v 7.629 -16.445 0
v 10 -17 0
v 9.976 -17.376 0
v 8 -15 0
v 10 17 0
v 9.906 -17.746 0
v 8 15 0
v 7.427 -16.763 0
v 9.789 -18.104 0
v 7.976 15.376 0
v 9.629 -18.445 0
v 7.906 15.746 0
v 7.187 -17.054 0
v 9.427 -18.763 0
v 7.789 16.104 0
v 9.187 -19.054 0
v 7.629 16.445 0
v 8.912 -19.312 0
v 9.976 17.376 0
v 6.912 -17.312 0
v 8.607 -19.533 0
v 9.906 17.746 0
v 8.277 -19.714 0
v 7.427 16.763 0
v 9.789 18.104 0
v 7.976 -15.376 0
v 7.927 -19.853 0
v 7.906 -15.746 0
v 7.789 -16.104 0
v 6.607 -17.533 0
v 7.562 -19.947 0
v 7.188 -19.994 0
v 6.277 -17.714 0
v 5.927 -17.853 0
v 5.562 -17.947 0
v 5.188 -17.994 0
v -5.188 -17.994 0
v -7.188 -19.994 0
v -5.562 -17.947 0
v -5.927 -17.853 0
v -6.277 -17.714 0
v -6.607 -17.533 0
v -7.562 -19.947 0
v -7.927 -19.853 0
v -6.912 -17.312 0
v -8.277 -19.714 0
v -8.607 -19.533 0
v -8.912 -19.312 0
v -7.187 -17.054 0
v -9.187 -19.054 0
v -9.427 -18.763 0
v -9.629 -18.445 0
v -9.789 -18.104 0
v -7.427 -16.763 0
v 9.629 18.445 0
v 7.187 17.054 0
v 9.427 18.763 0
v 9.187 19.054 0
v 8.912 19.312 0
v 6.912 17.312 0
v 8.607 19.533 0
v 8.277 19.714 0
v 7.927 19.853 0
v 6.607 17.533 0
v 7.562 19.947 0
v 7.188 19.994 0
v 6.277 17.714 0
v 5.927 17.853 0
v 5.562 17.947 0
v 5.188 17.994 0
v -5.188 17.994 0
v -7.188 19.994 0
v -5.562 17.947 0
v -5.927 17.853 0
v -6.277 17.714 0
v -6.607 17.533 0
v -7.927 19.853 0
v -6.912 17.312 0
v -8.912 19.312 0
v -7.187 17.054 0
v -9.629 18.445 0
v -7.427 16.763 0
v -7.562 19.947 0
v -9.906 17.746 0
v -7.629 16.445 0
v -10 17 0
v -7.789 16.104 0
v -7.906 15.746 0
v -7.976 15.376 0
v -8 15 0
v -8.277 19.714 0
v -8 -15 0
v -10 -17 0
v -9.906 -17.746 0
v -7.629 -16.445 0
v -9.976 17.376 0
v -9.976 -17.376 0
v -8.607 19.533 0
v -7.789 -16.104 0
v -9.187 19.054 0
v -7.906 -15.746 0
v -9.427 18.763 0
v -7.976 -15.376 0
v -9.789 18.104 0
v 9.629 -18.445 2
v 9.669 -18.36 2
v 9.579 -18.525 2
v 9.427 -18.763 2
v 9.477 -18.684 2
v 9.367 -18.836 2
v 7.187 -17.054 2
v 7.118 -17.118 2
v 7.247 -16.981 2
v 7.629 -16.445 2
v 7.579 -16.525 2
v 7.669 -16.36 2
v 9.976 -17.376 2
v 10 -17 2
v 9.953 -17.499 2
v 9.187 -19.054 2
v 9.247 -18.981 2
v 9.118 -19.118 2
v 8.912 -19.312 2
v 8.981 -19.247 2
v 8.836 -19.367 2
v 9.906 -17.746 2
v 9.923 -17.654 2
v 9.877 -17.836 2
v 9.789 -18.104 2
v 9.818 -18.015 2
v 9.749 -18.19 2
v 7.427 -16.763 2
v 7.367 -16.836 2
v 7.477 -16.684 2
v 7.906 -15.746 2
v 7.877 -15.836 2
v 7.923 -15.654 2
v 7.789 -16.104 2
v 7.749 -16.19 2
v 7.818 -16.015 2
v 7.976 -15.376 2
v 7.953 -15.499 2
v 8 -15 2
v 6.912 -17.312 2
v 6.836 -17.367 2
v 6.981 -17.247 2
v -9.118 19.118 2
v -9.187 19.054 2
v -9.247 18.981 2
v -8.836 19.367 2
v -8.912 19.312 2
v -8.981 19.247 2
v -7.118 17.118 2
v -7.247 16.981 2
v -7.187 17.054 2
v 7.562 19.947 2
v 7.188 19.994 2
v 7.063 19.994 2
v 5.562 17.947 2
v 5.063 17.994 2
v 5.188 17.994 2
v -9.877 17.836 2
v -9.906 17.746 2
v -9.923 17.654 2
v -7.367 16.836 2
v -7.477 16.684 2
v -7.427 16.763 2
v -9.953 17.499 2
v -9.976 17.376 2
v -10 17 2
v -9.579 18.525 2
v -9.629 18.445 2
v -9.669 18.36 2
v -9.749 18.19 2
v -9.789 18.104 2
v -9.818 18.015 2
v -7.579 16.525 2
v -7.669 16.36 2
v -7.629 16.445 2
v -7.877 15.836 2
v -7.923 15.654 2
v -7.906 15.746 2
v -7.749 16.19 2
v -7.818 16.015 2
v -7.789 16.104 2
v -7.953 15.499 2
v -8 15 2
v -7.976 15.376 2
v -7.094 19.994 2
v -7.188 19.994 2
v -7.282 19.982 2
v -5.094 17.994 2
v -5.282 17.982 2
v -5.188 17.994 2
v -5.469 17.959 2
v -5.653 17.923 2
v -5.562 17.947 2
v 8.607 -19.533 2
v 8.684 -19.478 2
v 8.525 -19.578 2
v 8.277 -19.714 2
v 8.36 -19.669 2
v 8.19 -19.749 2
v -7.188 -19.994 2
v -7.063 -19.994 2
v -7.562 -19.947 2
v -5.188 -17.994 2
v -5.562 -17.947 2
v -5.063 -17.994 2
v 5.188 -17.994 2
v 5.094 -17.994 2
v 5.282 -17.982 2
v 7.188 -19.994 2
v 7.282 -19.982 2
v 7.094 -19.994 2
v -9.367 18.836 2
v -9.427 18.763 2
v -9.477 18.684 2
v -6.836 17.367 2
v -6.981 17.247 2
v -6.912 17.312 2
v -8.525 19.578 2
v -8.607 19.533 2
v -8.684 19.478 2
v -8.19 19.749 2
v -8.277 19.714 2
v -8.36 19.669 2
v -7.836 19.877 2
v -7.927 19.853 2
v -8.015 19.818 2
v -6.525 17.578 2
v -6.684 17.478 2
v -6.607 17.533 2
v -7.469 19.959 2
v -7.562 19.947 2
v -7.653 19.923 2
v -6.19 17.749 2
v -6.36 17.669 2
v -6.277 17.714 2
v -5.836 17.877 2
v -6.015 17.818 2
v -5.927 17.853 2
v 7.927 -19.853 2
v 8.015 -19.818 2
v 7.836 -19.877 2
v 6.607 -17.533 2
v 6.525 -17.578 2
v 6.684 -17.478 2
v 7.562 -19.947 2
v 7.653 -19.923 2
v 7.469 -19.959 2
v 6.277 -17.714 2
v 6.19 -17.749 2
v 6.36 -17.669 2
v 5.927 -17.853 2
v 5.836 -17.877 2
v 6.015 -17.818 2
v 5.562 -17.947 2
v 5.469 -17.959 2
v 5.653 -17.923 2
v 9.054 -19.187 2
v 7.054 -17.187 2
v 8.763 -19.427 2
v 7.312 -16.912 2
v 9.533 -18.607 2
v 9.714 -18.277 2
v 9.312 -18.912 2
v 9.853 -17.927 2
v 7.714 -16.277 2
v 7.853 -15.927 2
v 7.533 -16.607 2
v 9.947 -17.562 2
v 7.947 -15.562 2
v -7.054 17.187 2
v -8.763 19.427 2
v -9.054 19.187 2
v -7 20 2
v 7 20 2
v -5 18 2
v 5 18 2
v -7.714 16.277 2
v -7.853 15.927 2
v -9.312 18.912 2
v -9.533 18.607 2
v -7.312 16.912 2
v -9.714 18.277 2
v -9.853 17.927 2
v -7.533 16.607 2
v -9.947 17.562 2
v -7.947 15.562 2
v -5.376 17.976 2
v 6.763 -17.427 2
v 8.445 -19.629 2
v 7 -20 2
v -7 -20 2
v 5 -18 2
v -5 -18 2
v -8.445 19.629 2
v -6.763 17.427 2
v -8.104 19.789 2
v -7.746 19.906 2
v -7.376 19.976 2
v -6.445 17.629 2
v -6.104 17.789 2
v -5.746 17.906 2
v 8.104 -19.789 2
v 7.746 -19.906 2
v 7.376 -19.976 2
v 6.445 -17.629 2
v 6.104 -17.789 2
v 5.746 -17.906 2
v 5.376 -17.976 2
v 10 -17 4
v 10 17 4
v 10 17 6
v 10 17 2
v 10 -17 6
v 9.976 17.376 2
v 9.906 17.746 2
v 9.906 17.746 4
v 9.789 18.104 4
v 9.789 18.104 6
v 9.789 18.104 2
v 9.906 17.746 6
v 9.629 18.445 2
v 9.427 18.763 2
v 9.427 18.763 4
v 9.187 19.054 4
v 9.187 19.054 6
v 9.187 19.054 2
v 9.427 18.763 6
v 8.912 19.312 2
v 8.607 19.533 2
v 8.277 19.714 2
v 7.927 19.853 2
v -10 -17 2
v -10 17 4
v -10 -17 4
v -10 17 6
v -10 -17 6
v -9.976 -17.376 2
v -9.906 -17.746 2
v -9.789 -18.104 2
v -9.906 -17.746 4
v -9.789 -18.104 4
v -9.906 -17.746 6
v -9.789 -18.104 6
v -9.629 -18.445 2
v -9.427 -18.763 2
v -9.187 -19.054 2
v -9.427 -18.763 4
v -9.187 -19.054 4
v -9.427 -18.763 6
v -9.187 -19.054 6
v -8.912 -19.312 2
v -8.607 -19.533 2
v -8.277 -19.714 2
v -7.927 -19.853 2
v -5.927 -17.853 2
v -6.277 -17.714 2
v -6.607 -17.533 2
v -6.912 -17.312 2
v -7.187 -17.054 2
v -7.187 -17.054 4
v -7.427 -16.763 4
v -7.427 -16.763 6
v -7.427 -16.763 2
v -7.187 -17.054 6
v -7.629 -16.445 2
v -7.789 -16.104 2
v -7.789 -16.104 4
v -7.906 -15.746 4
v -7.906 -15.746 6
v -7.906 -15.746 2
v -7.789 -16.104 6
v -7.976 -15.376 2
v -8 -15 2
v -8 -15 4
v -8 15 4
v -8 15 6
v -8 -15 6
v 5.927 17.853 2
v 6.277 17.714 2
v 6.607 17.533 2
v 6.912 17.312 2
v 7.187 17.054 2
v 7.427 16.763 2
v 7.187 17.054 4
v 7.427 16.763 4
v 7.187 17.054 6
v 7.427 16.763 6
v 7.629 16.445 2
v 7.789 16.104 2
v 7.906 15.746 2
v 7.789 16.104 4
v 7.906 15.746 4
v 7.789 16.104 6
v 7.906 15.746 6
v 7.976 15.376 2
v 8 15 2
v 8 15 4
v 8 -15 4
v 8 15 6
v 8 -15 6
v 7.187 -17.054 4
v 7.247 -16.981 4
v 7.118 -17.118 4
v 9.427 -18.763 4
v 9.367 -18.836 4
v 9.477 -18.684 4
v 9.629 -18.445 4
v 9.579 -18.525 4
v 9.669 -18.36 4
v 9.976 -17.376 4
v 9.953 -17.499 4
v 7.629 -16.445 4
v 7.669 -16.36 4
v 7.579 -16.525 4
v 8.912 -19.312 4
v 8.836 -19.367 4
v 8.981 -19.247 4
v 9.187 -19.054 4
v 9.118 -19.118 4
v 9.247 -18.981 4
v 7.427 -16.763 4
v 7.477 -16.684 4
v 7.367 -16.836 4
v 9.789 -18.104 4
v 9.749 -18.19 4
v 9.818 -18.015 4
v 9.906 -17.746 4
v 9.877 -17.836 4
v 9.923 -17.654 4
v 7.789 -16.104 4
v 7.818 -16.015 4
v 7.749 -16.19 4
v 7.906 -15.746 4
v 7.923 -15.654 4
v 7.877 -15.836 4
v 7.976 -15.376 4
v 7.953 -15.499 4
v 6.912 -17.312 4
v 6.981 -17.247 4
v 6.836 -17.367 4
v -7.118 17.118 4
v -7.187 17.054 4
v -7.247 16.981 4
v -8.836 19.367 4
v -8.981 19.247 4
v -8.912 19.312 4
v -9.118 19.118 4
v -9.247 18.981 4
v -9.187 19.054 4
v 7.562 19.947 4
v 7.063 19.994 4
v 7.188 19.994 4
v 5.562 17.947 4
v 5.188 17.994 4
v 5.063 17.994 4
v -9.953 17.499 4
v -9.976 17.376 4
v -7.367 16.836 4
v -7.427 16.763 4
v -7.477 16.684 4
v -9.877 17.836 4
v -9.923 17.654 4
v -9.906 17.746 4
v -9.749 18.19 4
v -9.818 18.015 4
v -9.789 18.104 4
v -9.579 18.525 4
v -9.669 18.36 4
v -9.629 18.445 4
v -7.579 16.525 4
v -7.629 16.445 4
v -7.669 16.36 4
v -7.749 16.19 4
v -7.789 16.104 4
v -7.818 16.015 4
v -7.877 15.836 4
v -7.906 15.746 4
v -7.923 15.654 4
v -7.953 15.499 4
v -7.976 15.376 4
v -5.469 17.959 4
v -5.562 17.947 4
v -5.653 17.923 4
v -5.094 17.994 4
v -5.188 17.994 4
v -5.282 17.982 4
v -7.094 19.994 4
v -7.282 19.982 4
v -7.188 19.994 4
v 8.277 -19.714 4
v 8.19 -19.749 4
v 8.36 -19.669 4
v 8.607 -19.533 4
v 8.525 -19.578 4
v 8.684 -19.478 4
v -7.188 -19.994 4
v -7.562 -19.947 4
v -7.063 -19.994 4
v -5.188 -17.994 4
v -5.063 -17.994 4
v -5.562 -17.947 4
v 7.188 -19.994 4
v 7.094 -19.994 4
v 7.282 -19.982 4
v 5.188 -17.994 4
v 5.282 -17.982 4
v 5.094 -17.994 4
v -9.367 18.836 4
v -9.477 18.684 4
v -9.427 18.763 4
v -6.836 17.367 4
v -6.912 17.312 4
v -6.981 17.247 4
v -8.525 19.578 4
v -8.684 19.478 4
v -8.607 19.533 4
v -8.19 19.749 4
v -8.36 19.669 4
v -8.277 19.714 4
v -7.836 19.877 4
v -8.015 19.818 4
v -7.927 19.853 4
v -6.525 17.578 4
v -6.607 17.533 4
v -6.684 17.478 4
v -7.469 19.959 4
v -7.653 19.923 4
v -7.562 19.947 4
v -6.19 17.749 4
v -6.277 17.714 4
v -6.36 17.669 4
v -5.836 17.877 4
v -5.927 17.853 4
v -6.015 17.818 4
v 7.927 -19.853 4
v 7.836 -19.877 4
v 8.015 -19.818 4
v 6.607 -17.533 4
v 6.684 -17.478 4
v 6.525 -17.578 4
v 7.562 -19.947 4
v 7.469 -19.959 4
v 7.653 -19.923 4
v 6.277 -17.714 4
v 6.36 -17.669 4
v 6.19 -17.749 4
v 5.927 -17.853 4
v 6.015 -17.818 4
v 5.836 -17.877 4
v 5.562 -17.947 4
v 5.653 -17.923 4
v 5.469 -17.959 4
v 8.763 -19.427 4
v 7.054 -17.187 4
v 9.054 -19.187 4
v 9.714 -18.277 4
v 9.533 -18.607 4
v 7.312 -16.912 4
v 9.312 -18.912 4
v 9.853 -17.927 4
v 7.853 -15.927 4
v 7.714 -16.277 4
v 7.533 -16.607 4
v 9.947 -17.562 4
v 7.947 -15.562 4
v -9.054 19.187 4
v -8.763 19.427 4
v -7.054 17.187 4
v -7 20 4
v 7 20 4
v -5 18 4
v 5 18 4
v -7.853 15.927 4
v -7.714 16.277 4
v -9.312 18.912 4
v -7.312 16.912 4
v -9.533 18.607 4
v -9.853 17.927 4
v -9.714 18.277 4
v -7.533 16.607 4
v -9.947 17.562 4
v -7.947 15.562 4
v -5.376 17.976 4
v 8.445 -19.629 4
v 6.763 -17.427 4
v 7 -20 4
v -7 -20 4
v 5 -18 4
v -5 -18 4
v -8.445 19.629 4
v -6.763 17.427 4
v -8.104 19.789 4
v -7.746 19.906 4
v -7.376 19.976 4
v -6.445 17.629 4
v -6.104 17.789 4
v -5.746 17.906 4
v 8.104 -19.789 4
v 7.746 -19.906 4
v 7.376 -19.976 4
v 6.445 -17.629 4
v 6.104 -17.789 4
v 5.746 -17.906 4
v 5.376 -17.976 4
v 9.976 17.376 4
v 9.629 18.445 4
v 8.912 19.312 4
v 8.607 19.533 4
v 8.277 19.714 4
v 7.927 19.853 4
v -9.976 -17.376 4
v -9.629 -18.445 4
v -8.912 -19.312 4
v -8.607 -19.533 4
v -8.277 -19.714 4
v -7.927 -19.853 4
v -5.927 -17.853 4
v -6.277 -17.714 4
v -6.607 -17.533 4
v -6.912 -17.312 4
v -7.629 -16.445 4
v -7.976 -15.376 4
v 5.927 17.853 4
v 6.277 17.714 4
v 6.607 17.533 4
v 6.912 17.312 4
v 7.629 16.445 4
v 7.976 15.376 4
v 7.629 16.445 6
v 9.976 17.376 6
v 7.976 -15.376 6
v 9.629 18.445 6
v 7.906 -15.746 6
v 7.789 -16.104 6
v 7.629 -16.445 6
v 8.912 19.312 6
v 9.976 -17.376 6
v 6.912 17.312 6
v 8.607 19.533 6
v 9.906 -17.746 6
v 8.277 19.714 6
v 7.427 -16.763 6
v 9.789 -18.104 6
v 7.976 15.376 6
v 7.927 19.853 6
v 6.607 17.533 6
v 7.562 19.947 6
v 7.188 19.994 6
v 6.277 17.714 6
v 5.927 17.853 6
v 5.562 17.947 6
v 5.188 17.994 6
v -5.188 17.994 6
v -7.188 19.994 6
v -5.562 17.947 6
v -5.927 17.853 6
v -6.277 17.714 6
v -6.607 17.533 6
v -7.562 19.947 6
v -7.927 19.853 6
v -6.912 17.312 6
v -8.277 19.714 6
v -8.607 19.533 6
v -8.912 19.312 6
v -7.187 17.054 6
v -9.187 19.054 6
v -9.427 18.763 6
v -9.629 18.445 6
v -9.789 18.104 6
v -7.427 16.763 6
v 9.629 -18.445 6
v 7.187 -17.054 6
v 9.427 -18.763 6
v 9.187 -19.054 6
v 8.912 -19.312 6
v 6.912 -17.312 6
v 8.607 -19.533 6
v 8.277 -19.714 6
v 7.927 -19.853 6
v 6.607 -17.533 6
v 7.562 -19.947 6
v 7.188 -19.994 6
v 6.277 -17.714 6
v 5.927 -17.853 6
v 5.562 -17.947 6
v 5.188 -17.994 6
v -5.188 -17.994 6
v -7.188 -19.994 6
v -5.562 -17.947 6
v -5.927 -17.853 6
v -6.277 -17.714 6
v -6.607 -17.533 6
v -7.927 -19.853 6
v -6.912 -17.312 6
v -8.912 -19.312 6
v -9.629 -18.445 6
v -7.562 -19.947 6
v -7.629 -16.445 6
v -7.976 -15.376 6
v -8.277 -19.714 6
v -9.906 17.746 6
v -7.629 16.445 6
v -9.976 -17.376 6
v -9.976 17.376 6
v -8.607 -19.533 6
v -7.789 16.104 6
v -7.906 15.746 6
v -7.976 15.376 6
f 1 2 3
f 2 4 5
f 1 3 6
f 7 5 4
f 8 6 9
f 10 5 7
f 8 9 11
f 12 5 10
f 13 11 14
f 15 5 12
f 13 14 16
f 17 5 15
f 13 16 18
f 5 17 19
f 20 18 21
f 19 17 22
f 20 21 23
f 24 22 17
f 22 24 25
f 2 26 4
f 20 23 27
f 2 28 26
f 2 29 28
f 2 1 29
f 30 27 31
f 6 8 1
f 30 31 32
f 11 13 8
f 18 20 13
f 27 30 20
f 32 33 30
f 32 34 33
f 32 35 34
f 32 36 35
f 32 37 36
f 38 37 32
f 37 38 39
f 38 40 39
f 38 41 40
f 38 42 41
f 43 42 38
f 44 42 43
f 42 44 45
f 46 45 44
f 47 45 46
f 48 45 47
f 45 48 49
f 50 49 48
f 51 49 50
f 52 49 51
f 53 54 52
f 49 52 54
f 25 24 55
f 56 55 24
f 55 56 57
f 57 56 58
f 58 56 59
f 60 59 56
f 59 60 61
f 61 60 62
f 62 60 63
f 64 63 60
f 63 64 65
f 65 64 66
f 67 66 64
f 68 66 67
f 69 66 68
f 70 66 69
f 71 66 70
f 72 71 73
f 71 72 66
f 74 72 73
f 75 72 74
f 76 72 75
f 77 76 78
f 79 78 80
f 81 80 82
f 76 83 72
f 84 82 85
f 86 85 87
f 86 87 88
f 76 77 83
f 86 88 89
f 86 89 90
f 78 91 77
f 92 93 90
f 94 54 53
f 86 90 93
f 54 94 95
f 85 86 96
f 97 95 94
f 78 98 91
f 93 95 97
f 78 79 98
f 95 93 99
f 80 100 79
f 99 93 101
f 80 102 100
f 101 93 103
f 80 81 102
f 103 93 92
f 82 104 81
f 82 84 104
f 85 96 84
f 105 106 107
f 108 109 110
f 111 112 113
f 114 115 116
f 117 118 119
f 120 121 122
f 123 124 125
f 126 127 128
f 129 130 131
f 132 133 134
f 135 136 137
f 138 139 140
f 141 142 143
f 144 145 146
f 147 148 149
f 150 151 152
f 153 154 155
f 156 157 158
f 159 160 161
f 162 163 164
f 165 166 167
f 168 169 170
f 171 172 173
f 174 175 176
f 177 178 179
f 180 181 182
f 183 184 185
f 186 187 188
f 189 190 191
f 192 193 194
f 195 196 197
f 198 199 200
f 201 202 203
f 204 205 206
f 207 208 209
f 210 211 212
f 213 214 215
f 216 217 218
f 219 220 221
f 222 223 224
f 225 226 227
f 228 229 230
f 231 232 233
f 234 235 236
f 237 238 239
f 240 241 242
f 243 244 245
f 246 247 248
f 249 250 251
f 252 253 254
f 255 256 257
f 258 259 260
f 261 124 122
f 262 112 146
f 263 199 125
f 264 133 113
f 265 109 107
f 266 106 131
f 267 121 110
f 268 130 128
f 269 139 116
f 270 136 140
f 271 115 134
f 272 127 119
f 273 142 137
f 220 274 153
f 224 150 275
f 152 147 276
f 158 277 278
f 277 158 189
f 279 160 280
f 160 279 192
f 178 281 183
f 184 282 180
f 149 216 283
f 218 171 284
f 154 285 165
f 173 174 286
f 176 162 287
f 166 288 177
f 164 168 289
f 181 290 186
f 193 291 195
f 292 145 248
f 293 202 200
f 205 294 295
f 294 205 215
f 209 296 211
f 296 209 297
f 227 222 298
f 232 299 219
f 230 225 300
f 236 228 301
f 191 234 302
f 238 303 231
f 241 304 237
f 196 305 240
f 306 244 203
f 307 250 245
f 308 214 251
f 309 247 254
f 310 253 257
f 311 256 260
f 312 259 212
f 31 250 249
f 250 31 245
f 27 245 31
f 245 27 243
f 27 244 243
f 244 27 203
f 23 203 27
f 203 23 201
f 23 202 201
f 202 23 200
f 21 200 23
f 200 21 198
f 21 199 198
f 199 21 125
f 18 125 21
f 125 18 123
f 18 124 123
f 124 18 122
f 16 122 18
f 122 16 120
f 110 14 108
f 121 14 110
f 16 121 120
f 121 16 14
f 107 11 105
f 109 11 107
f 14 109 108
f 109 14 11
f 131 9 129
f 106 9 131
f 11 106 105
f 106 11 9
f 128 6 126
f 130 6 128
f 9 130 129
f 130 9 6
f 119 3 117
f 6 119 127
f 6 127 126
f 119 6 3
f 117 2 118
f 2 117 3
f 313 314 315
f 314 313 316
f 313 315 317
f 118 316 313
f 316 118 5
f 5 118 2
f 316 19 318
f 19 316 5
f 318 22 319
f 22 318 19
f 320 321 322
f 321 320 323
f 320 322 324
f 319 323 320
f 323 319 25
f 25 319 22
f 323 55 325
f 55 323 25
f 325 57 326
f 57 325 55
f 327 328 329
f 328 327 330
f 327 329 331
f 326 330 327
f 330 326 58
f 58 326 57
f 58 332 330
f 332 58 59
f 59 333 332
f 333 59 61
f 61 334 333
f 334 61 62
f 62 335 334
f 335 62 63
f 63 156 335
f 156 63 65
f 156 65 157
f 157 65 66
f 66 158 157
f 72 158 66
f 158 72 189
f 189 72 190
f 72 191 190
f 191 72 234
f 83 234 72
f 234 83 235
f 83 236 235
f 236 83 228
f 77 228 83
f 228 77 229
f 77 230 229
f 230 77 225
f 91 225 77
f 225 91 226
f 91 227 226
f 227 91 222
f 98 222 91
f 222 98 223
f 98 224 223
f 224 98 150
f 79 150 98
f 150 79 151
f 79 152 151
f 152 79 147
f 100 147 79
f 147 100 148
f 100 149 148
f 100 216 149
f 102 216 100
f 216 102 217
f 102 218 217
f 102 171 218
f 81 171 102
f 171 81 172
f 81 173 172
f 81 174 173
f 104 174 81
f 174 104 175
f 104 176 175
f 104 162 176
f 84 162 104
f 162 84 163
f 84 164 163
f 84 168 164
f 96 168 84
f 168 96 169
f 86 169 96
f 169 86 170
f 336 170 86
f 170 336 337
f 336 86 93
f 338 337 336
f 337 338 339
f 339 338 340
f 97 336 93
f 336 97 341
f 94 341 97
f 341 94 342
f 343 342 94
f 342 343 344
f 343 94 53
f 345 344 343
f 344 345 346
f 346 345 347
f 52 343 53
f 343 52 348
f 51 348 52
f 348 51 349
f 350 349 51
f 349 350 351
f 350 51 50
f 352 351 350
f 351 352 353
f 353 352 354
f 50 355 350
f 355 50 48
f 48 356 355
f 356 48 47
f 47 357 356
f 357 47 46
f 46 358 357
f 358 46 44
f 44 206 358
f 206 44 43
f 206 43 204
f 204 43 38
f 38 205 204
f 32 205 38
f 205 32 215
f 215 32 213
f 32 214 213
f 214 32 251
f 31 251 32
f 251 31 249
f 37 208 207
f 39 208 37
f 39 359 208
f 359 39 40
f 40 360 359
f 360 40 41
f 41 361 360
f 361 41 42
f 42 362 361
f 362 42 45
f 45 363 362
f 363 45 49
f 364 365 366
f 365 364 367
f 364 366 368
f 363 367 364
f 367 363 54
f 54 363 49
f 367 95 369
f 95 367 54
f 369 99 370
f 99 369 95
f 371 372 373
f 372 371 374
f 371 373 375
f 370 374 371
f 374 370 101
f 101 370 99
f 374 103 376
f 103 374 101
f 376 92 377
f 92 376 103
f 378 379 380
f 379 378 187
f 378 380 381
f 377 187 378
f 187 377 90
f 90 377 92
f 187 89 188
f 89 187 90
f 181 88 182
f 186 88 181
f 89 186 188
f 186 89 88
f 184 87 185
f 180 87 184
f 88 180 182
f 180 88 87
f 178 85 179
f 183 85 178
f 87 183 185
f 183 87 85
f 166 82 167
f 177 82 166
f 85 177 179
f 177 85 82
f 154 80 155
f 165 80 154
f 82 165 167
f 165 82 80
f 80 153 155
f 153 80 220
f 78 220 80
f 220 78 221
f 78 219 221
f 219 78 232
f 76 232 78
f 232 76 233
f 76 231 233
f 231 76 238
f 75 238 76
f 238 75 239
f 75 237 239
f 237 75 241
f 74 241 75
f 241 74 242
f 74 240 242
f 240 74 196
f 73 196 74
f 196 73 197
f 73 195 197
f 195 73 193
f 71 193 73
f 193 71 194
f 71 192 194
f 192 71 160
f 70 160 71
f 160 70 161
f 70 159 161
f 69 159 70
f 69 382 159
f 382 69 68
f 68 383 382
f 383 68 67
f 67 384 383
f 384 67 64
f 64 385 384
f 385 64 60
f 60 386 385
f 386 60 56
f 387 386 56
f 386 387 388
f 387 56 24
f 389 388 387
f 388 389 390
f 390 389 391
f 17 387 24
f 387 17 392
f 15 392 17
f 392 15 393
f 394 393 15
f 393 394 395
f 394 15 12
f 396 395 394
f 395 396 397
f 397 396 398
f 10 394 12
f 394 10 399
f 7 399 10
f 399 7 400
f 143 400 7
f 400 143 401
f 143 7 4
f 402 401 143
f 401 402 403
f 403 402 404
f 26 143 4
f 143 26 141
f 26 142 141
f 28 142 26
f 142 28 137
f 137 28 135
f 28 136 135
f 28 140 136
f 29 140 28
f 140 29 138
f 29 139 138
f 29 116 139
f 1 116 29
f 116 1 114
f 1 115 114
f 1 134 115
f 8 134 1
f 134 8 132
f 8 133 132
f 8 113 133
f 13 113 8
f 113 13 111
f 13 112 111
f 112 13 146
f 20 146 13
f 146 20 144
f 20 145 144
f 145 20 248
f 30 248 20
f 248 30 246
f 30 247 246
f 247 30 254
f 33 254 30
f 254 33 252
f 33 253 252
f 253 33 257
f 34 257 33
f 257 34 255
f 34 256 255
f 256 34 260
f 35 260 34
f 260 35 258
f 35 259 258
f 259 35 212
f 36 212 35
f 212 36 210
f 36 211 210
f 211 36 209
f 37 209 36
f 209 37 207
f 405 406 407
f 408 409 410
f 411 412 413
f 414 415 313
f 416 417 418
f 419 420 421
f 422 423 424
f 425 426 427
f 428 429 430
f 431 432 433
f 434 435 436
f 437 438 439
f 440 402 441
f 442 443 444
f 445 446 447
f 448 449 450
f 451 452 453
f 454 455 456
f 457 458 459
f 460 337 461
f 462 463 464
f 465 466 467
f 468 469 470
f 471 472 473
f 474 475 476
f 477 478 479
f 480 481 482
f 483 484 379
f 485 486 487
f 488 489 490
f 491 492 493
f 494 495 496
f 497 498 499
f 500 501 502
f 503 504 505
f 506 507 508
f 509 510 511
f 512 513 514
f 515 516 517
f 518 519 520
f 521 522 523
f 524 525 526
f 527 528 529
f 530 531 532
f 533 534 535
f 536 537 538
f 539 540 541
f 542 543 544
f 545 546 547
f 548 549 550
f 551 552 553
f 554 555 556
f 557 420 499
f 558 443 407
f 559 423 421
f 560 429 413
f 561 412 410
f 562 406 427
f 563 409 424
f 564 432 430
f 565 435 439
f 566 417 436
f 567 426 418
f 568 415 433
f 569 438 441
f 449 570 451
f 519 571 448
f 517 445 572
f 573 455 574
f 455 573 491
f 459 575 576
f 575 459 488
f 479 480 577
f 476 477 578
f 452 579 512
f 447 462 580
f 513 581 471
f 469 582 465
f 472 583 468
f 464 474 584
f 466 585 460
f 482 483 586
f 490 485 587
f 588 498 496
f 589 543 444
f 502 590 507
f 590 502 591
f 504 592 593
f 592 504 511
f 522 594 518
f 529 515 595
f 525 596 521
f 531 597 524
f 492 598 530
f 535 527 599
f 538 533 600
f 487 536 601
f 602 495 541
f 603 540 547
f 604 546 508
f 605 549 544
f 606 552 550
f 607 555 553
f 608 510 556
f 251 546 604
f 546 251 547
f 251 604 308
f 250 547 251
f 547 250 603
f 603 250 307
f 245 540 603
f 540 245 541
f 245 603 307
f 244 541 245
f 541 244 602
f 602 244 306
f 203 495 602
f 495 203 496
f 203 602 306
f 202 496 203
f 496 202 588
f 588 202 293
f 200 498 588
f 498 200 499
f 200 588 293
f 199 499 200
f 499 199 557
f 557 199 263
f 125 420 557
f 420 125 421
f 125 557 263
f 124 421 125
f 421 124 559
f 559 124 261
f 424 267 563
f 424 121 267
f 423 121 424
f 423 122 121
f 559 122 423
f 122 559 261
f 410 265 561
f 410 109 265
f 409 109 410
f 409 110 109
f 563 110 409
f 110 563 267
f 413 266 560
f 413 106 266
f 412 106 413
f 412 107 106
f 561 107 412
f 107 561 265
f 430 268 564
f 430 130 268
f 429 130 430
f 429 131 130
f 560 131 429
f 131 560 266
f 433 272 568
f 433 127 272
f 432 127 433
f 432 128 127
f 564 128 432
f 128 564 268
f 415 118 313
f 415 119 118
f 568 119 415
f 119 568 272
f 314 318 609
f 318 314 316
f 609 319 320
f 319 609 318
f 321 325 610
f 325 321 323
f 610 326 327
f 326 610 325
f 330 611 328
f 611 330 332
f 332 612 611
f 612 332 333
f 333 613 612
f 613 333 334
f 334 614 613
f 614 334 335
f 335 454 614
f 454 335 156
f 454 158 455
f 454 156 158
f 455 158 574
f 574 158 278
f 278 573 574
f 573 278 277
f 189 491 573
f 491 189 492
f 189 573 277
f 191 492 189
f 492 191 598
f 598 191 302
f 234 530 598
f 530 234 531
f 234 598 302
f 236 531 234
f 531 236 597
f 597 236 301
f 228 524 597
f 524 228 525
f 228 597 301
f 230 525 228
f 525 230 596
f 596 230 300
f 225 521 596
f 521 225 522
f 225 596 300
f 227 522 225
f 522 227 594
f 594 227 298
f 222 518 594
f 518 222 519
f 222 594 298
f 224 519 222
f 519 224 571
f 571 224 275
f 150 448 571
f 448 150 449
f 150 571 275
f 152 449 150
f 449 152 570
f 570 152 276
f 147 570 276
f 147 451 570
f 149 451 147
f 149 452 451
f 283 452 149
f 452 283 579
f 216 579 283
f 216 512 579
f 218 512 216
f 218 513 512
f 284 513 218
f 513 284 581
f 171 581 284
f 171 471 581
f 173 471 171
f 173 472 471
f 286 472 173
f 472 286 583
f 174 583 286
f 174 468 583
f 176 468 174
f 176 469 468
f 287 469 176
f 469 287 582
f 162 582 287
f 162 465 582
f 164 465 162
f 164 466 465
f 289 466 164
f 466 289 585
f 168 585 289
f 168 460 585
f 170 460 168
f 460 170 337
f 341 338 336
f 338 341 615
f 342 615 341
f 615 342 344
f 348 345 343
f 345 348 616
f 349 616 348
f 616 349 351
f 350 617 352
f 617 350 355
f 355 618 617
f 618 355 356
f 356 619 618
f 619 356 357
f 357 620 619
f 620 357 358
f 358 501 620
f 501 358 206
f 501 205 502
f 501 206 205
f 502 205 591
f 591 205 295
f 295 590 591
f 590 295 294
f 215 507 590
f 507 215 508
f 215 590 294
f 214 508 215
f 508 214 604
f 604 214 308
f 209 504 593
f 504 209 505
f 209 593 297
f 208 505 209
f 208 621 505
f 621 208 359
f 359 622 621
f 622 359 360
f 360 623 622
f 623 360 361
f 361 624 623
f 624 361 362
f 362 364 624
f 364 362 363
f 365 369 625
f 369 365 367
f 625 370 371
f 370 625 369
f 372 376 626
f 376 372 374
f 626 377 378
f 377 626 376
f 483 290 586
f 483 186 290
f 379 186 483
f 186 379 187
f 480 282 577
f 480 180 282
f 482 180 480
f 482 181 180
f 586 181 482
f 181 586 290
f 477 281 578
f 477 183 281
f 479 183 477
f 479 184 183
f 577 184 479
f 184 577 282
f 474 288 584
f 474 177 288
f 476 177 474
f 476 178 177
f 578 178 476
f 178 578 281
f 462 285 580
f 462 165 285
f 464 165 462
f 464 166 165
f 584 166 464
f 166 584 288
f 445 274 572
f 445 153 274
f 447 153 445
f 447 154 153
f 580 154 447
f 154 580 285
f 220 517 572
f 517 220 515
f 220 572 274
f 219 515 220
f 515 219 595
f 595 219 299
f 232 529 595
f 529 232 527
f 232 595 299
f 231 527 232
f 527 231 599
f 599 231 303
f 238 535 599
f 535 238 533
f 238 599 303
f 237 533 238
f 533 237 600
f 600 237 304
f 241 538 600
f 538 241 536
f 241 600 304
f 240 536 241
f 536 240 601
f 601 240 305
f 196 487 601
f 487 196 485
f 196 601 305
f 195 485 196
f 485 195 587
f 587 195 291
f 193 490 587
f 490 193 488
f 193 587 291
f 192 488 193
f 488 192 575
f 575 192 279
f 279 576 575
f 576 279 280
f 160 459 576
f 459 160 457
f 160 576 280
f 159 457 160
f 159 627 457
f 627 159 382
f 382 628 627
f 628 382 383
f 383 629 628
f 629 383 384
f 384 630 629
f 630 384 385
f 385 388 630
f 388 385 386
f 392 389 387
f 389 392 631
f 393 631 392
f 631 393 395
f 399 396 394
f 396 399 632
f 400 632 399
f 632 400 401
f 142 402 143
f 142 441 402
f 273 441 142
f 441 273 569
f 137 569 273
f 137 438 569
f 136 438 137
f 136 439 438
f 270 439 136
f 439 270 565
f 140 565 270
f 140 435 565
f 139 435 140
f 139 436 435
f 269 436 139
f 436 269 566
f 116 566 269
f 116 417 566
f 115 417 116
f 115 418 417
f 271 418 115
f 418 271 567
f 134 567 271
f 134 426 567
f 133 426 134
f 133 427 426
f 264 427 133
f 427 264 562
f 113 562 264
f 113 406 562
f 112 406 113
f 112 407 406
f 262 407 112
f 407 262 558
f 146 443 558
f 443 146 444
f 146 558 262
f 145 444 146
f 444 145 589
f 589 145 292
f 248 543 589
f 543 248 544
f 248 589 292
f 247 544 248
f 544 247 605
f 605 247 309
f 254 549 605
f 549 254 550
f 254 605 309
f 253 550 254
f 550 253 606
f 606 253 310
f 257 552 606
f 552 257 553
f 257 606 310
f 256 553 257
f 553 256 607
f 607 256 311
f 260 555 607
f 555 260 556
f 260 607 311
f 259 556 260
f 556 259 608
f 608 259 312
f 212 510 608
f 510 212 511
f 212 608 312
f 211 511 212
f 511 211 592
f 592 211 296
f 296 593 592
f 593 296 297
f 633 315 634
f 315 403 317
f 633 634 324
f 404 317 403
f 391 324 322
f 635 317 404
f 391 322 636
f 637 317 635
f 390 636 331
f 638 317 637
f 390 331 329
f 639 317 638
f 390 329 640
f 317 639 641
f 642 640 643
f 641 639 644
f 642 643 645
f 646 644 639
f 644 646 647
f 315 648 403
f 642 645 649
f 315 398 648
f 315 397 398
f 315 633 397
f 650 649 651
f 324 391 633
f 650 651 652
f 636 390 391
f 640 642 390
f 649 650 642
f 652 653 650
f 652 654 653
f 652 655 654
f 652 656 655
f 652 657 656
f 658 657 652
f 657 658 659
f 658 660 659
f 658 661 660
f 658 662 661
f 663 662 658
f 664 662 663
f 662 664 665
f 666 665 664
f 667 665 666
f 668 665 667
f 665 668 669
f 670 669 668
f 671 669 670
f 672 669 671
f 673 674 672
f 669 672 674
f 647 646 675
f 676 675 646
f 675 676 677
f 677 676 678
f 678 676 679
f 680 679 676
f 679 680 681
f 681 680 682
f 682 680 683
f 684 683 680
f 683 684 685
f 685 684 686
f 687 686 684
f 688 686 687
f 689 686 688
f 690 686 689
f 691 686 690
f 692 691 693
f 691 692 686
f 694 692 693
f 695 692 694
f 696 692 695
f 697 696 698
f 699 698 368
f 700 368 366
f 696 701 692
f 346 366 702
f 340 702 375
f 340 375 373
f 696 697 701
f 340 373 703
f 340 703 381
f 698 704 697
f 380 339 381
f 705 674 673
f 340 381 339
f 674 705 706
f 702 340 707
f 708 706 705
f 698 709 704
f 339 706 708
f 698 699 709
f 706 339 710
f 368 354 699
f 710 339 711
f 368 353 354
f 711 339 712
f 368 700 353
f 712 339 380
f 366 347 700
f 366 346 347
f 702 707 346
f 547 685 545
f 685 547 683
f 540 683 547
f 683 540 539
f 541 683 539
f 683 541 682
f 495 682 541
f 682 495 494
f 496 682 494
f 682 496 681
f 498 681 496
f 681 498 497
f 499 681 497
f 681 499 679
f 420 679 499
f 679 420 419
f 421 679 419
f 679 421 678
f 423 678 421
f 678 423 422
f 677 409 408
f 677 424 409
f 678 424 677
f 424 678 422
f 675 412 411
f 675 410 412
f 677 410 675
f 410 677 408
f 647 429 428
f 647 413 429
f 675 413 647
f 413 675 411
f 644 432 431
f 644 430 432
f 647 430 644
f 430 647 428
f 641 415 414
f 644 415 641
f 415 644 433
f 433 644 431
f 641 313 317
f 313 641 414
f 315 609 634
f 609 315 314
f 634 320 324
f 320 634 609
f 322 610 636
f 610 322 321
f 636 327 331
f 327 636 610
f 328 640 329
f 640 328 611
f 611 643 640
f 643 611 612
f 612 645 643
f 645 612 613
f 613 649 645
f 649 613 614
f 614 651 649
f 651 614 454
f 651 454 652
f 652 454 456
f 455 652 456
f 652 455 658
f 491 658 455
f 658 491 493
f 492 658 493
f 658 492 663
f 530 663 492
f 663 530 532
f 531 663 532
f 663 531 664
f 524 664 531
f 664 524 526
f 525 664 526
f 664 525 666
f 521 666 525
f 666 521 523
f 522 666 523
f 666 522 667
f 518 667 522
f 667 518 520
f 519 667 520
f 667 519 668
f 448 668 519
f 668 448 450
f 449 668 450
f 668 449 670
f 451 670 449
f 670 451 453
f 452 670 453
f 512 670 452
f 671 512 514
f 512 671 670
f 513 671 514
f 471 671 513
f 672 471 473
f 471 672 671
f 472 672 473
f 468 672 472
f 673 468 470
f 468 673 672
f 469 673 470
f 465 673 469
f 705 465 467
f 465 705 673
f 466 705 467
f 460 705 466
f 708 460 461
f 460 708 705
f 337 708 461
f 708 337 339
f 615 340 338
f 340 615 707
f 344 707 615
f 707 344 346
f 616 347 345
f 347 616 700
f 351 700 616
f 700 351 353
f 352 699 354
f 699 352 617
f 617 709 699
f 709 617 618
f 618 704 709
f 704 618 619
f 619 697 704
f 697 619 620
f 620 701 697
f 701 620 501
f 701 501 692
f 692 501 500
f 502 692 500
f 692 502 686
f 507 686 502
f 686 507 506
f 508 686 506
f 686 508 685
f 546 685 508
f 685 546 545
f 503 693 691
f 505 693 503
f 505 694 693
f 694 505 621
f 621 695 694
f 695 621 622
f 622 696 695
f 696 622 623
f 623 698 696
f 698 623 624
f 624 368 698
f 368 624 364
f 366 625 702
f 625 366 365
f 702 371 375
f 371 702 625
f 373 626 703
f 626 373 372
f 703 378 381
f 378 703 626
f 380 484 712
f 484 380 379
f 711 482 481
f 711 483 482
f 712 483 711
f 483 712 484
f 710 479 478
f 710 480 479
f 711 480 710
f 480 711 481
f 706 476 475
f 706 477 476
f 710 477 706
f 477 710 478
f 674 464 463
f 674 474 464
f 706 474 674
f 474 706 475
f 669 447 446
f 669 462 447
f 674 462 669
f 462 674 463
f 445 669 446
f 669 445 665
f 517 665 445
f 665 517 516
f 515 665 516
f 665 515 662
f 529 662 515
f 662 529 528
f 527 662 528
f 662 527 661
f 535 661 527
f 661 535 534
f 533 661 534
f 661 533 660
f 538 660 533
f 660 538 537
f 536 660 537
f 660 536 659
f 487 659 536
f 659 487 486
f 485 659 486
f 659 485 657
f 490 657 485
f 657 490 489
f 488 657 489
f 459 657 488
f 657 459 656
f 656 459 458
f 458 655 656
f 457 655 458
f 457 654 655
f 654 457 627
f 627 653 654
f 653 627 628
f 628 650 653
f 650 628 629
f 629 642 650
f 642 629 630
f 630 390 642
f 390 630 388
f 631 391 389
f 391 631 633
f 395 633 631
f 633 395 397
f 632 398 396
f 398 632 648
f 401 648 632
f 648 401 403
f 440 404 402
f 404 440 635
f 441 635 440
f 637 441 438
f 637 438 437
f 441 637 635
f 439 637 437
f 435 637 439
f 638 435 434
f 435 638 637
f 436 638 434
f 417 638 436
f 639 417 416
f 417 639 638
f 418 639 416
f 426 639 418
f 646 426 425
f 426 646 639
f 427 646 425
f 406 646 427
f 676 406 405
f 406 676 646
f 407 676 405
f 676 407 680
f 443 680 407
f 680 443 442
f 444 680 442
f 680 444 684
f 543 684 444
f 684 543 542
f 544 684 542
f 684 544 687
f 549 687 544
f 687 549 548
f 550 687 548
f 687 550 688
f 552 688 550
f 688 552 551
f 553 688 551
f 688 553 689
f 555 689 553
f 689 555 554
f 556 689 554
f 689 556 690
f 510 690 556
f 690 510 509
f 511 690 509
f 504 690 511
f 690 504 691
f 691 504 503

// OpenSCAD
$fn = 50;

// ------------------------------------------------------------
// Rounded Square (minkowski)
// ------------------------------------------------------------

module rsquare(size, radius) {
  assert(radius < size.x / 2, "Radius must be less than half the width");
  assert(radius < size.y / 2, "Radius must be less than half the height");

  minkowski() {
    square([ size.x - radius * 2, size.y - radius * 2 ], center = true);
    circle(radius);
  }
}

module rsquare_shell(size, radius, thickness) {
  difference() {
    rsquare(size, radius);

    x = size.x - thickness * 2;
    y = size.y - thickness * 2;
    rsquare([ x, y ], radius);
  }
}

// ------------------------------------------------------------
// Rounded Square (offset)
// ------------------------------------------------------------

module rsquare2(size, radius) {
  x = size.x - radius * 2;
  y = size.y - radius * 2;

  assert(radius < size.x / 2, "Radius must be less than half the height");
  assert(radius < size.y / 2, "Radius must be less than half the width");

  offset(r = radius) square([ x, y ], center = true);
}

module rsquare2_shell(size, radius, thickness) {
  difference() {
    rsquare2(size, radius);

    x = size.x - thickness * 2;
    y = size.y - thickness * 2;
    rsquare2([ x, y ], radius);
  }
}

// ------------------------------------------------------------
// Rounded Square (hull)
// ------------------------------------------------------------

module rsquare3(size, radius) {
  x = size.x - radius * 2;
  y = size.y - radius * 2;

  assert(radius < size.x / 2, "Radius must be less than half the height");
  assert(radius < size.y / 2, "Radius must be less than half the width");

  hull() {
    translate([ -x / 2, -y / 2 ]) circle(r = radius);
    translate([ x / 2, -y / 2 ]) circle(r = radius);
    translate([ -x / 2, y / 2 ]) circle(r = radius);
    translate([ x / 2, y / 2 ]) circle(r = radius);
  }
}

module rsquare3_shell(size, radius, thickness) {
  difference() {
    rsquare3(size, radius);

    x = size.x - thickness * 2;
    y = size.y - thickness * 2;
    rsquare3([ x, y ], radius);
  }
}

// ------------------------------------------------------------
// Test
// ------------------------------------------------------------

color("green") linear_extrude(2) rsquare_shell([ 20, 40 ], 3, 2);
color("red") translate([ 0, 0, 2 ]) linear_extrude(2)
    rsquare2_shell([ 20, 40 ], 3, 2);
color("blue") translate([ 0, 0, 4 ]) linear_extrude(2)
    rsquare3_shell([ 20, 40 ], 3, 2);
